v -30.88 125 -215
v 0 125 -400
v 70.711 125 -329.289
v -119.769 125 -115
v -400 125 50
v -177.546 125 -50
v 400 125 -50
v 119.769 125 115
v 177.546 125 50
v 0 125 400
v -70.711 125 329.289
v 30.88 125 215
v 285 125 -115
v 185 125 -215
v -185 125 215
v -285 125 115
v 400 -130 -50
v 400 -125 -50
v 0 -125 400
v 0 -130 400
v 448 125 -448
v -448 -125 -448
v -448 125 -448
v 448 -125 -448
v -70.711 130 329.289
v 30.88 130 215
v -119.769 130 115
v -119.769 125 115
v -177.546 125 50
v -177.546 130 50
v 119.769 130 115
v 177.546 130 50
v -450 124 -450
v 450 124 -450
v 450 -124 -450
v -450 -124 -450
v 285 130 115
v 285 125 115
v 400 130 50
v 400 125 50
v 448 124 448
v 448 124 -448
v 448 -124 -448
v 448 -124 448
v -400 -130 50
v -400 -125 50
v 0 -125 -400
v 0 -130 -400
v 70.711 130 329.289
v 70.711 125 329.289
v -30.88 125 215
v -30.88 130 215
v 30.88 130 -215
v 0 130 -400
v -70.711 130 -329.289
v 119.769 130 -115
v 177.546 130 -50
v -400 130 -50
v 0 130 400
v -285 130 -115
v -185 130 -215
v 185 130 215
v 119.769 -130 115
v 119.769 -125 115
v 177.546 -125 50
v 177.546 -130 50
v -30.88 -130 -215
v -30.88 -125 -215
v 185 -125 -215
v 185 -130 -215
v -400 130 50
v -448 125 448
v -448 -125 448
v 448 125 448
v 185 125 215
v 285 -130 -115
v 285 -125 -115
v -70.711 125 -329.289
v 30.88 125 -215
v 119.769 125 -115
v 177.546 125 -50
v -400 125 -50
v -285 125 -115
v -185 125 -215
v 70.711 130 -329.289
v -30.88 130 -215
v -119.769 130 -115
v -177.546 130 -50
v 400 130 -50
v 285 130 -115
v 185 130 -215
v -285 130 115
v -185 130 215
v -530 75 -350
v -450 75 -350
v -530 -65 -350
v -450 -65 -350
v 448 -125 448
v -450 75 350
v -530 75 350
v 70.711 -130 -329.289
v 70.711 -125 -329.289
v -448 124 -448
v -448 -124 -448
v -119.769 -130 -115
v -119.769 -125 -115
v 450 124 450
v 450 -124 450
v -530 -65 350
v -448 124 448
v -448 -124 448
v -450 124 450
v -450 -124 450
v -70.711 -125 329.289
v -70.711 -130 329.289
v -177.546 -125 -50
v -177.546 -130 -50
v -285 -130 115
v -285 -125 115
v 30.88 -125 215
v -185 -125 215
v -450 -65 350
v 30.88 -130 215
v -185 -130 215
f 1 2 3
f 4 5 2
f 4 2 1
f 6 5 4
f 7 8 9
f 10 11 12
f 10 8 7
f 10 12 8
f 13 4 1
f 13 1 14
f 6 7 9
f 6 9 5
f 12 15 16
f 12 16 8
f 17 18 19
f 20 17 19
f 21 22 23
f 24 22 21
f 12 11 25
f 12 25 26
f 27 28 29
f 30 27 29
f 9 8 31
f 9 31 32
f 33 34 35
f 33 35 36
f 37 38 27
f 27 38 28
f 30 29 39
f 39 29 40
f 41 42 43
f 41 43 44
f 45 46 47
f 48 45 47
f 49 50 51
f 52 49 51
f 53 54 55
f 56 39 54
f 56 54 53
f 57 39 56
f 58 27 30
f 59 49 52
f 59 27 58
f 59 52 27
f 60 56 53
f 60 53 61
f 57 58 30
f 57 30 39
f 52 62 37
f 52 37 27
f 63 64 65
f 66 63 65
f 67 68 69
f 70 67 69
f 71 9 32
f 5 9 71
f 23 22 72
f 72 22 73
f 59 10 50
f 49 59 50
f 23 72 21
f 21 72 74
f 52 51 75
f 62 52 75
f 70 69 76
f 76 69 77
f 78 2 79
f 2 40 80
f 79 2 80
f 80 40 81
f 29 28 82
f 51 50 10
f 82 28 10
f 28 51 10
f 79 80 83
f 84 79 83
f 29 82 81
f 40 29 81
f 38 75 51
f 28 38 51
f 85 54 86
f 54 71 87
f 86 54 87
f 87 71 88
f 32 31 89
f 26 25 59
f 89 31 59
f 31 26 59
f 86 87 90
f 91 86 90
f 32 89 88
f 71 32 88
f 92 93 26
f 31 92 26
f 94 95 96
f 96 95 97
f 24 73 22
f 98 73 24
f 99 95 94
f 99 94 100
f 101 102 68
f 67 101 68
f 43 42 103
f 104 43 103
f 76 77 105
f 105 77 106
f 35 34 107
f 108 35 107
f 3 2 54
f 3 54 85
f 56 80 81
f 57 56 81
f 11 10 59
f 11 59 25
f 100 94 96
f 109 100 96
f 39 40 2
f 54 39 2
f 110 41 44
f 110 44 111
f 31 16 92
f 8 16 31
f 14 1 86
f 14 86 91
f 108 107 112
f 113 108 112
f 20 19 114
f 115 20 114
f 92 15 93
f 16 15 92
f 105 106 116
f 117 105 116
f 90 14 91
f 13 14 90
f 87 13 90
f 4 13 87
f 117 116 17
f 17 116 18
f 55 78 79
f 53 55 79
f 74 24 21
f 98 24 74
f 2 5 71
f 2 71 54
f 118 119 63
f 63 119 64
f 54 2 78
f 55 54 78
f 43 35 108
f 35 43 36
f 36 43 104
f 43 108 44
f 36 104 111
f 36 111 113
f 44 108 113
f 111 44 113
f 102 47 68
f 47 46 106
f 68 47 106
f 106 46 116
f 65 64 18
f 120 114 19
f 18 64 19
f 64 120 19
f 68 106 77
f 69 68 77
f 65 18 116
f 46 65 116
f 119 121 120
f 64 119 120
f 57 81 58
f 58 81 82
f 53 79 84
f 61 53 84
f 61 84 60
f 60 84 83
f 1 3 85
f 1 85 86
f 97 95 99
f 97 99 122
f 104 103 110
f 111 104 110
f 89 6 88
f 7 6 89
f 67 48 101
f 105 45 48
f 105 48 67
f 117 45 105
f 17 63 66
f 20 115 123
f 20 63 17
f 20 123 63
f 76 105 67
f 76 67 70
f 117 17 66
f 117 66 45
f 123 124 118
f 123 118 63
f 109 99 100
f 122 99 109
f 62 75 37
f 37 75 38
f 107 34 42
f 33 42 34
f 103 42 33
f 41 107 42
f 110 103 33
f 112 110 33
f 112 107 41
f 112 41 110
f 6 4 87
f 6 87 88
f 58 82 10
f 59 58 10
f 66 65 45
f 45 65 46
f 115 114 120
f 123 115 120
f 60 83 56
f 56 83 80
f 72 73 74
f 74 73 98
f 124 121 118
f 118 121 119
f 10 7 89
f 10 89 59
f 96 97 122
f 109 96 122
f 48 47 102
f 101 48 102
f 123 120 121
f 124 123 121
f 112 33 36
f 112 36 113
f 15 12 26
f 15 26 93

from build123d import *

# Parameters (mm, degrees)
F0_W      = 900
F0_H      = 900
F1_DEPTH  = 125
F3_DEPTH  = 5
F6_W      = 900
F6_H      = 900
F6_W_2    = 896
F6_H_2    = 896
F7_DEPTH  = 255.001
F9_W      = 900
F9_H      = 900
F9_W_2    = 896
F9_H_2    = 896
F10_DEPTH = 248
F11_W     = 140
F11_H     = 700
F12_DEPTH = 80


with BuildPart() as f1:
    # F0 (on Front) → F1 (new body, symmetric)
    with BuildSketch(Plane.XZ):
        Rectangle(F0_W, F0_H)
    extrude(amount=F1_DEPTH, both=True)

    # F6 (on face) → F7 (cut, through all)
    with BuildSketch(Plane.XZ.offset(125)):
        Rectangle(F6_W, F6_H)
        Rectangle(F6_W_2, F6_H_2, mode=Mode.SUBTRACT)
    extrude(amount=-F7_DEPTH, mode=Mode.SUBTRACT)


with BuildPart() as f3:
    # F2 (on face) → F3 (new body)
    with BuildSketch(Plane.XZ.offset(125)):
        Polygon((-400, 50), (0, -400), (70.7106781187, -329.2893218813), (-30.8798302203, -215), (185, -215), (285, -115), (-119.7687191092, -115), (-177.546496887, -50), (400, -50), (0, 400), (-70.7106781187, 329.2893218813), (30.8798302203, 215), (-185, 215), (-285, 115), (119.7687191092, 115), (177.546496887, 50), align=None)
    extrude(amount=F3_DEPTH)


with BuildPart() as f4_1:
    # F4: instance of F3
    add(f3.part.mirror(Plane.XZ))


with BuildPart() as f5_1:
    # F5: instance of F4_1
    add(f4_1.part.mirror(Plane.YZ))


with BuildPart() as f10:
    # F9 (on offset) → F10 (new body)
    with BuildSketch(Plane(origin=(0, 124, 0), x_dir=(-1, 0, 0), z_dir=(0, 1, 0))):
        Rectangle(F9_W, F9_H)
        Rectangle(F9_W_2, F9_H_2, mode=Mode.SUBTRACT)
    extrude(amount=-F10_DEPTH)


with BuildPart() as f12:
    # F11 (on face) → F12 (new body)
    with BuildSketch(Plane(origin=(-450, 0, 0), x_dir=(0, -1, 0), z_dir=(-1, 0, 0))):
        with Locations((-5, 0)):
            Rectangle(F11_W, F11_H)
    extrude(amount=F12_DEPTH)


solid = Compound([f1.part, f3.part, f4_1.part, f5_1.part, f10.part, f12.part])
